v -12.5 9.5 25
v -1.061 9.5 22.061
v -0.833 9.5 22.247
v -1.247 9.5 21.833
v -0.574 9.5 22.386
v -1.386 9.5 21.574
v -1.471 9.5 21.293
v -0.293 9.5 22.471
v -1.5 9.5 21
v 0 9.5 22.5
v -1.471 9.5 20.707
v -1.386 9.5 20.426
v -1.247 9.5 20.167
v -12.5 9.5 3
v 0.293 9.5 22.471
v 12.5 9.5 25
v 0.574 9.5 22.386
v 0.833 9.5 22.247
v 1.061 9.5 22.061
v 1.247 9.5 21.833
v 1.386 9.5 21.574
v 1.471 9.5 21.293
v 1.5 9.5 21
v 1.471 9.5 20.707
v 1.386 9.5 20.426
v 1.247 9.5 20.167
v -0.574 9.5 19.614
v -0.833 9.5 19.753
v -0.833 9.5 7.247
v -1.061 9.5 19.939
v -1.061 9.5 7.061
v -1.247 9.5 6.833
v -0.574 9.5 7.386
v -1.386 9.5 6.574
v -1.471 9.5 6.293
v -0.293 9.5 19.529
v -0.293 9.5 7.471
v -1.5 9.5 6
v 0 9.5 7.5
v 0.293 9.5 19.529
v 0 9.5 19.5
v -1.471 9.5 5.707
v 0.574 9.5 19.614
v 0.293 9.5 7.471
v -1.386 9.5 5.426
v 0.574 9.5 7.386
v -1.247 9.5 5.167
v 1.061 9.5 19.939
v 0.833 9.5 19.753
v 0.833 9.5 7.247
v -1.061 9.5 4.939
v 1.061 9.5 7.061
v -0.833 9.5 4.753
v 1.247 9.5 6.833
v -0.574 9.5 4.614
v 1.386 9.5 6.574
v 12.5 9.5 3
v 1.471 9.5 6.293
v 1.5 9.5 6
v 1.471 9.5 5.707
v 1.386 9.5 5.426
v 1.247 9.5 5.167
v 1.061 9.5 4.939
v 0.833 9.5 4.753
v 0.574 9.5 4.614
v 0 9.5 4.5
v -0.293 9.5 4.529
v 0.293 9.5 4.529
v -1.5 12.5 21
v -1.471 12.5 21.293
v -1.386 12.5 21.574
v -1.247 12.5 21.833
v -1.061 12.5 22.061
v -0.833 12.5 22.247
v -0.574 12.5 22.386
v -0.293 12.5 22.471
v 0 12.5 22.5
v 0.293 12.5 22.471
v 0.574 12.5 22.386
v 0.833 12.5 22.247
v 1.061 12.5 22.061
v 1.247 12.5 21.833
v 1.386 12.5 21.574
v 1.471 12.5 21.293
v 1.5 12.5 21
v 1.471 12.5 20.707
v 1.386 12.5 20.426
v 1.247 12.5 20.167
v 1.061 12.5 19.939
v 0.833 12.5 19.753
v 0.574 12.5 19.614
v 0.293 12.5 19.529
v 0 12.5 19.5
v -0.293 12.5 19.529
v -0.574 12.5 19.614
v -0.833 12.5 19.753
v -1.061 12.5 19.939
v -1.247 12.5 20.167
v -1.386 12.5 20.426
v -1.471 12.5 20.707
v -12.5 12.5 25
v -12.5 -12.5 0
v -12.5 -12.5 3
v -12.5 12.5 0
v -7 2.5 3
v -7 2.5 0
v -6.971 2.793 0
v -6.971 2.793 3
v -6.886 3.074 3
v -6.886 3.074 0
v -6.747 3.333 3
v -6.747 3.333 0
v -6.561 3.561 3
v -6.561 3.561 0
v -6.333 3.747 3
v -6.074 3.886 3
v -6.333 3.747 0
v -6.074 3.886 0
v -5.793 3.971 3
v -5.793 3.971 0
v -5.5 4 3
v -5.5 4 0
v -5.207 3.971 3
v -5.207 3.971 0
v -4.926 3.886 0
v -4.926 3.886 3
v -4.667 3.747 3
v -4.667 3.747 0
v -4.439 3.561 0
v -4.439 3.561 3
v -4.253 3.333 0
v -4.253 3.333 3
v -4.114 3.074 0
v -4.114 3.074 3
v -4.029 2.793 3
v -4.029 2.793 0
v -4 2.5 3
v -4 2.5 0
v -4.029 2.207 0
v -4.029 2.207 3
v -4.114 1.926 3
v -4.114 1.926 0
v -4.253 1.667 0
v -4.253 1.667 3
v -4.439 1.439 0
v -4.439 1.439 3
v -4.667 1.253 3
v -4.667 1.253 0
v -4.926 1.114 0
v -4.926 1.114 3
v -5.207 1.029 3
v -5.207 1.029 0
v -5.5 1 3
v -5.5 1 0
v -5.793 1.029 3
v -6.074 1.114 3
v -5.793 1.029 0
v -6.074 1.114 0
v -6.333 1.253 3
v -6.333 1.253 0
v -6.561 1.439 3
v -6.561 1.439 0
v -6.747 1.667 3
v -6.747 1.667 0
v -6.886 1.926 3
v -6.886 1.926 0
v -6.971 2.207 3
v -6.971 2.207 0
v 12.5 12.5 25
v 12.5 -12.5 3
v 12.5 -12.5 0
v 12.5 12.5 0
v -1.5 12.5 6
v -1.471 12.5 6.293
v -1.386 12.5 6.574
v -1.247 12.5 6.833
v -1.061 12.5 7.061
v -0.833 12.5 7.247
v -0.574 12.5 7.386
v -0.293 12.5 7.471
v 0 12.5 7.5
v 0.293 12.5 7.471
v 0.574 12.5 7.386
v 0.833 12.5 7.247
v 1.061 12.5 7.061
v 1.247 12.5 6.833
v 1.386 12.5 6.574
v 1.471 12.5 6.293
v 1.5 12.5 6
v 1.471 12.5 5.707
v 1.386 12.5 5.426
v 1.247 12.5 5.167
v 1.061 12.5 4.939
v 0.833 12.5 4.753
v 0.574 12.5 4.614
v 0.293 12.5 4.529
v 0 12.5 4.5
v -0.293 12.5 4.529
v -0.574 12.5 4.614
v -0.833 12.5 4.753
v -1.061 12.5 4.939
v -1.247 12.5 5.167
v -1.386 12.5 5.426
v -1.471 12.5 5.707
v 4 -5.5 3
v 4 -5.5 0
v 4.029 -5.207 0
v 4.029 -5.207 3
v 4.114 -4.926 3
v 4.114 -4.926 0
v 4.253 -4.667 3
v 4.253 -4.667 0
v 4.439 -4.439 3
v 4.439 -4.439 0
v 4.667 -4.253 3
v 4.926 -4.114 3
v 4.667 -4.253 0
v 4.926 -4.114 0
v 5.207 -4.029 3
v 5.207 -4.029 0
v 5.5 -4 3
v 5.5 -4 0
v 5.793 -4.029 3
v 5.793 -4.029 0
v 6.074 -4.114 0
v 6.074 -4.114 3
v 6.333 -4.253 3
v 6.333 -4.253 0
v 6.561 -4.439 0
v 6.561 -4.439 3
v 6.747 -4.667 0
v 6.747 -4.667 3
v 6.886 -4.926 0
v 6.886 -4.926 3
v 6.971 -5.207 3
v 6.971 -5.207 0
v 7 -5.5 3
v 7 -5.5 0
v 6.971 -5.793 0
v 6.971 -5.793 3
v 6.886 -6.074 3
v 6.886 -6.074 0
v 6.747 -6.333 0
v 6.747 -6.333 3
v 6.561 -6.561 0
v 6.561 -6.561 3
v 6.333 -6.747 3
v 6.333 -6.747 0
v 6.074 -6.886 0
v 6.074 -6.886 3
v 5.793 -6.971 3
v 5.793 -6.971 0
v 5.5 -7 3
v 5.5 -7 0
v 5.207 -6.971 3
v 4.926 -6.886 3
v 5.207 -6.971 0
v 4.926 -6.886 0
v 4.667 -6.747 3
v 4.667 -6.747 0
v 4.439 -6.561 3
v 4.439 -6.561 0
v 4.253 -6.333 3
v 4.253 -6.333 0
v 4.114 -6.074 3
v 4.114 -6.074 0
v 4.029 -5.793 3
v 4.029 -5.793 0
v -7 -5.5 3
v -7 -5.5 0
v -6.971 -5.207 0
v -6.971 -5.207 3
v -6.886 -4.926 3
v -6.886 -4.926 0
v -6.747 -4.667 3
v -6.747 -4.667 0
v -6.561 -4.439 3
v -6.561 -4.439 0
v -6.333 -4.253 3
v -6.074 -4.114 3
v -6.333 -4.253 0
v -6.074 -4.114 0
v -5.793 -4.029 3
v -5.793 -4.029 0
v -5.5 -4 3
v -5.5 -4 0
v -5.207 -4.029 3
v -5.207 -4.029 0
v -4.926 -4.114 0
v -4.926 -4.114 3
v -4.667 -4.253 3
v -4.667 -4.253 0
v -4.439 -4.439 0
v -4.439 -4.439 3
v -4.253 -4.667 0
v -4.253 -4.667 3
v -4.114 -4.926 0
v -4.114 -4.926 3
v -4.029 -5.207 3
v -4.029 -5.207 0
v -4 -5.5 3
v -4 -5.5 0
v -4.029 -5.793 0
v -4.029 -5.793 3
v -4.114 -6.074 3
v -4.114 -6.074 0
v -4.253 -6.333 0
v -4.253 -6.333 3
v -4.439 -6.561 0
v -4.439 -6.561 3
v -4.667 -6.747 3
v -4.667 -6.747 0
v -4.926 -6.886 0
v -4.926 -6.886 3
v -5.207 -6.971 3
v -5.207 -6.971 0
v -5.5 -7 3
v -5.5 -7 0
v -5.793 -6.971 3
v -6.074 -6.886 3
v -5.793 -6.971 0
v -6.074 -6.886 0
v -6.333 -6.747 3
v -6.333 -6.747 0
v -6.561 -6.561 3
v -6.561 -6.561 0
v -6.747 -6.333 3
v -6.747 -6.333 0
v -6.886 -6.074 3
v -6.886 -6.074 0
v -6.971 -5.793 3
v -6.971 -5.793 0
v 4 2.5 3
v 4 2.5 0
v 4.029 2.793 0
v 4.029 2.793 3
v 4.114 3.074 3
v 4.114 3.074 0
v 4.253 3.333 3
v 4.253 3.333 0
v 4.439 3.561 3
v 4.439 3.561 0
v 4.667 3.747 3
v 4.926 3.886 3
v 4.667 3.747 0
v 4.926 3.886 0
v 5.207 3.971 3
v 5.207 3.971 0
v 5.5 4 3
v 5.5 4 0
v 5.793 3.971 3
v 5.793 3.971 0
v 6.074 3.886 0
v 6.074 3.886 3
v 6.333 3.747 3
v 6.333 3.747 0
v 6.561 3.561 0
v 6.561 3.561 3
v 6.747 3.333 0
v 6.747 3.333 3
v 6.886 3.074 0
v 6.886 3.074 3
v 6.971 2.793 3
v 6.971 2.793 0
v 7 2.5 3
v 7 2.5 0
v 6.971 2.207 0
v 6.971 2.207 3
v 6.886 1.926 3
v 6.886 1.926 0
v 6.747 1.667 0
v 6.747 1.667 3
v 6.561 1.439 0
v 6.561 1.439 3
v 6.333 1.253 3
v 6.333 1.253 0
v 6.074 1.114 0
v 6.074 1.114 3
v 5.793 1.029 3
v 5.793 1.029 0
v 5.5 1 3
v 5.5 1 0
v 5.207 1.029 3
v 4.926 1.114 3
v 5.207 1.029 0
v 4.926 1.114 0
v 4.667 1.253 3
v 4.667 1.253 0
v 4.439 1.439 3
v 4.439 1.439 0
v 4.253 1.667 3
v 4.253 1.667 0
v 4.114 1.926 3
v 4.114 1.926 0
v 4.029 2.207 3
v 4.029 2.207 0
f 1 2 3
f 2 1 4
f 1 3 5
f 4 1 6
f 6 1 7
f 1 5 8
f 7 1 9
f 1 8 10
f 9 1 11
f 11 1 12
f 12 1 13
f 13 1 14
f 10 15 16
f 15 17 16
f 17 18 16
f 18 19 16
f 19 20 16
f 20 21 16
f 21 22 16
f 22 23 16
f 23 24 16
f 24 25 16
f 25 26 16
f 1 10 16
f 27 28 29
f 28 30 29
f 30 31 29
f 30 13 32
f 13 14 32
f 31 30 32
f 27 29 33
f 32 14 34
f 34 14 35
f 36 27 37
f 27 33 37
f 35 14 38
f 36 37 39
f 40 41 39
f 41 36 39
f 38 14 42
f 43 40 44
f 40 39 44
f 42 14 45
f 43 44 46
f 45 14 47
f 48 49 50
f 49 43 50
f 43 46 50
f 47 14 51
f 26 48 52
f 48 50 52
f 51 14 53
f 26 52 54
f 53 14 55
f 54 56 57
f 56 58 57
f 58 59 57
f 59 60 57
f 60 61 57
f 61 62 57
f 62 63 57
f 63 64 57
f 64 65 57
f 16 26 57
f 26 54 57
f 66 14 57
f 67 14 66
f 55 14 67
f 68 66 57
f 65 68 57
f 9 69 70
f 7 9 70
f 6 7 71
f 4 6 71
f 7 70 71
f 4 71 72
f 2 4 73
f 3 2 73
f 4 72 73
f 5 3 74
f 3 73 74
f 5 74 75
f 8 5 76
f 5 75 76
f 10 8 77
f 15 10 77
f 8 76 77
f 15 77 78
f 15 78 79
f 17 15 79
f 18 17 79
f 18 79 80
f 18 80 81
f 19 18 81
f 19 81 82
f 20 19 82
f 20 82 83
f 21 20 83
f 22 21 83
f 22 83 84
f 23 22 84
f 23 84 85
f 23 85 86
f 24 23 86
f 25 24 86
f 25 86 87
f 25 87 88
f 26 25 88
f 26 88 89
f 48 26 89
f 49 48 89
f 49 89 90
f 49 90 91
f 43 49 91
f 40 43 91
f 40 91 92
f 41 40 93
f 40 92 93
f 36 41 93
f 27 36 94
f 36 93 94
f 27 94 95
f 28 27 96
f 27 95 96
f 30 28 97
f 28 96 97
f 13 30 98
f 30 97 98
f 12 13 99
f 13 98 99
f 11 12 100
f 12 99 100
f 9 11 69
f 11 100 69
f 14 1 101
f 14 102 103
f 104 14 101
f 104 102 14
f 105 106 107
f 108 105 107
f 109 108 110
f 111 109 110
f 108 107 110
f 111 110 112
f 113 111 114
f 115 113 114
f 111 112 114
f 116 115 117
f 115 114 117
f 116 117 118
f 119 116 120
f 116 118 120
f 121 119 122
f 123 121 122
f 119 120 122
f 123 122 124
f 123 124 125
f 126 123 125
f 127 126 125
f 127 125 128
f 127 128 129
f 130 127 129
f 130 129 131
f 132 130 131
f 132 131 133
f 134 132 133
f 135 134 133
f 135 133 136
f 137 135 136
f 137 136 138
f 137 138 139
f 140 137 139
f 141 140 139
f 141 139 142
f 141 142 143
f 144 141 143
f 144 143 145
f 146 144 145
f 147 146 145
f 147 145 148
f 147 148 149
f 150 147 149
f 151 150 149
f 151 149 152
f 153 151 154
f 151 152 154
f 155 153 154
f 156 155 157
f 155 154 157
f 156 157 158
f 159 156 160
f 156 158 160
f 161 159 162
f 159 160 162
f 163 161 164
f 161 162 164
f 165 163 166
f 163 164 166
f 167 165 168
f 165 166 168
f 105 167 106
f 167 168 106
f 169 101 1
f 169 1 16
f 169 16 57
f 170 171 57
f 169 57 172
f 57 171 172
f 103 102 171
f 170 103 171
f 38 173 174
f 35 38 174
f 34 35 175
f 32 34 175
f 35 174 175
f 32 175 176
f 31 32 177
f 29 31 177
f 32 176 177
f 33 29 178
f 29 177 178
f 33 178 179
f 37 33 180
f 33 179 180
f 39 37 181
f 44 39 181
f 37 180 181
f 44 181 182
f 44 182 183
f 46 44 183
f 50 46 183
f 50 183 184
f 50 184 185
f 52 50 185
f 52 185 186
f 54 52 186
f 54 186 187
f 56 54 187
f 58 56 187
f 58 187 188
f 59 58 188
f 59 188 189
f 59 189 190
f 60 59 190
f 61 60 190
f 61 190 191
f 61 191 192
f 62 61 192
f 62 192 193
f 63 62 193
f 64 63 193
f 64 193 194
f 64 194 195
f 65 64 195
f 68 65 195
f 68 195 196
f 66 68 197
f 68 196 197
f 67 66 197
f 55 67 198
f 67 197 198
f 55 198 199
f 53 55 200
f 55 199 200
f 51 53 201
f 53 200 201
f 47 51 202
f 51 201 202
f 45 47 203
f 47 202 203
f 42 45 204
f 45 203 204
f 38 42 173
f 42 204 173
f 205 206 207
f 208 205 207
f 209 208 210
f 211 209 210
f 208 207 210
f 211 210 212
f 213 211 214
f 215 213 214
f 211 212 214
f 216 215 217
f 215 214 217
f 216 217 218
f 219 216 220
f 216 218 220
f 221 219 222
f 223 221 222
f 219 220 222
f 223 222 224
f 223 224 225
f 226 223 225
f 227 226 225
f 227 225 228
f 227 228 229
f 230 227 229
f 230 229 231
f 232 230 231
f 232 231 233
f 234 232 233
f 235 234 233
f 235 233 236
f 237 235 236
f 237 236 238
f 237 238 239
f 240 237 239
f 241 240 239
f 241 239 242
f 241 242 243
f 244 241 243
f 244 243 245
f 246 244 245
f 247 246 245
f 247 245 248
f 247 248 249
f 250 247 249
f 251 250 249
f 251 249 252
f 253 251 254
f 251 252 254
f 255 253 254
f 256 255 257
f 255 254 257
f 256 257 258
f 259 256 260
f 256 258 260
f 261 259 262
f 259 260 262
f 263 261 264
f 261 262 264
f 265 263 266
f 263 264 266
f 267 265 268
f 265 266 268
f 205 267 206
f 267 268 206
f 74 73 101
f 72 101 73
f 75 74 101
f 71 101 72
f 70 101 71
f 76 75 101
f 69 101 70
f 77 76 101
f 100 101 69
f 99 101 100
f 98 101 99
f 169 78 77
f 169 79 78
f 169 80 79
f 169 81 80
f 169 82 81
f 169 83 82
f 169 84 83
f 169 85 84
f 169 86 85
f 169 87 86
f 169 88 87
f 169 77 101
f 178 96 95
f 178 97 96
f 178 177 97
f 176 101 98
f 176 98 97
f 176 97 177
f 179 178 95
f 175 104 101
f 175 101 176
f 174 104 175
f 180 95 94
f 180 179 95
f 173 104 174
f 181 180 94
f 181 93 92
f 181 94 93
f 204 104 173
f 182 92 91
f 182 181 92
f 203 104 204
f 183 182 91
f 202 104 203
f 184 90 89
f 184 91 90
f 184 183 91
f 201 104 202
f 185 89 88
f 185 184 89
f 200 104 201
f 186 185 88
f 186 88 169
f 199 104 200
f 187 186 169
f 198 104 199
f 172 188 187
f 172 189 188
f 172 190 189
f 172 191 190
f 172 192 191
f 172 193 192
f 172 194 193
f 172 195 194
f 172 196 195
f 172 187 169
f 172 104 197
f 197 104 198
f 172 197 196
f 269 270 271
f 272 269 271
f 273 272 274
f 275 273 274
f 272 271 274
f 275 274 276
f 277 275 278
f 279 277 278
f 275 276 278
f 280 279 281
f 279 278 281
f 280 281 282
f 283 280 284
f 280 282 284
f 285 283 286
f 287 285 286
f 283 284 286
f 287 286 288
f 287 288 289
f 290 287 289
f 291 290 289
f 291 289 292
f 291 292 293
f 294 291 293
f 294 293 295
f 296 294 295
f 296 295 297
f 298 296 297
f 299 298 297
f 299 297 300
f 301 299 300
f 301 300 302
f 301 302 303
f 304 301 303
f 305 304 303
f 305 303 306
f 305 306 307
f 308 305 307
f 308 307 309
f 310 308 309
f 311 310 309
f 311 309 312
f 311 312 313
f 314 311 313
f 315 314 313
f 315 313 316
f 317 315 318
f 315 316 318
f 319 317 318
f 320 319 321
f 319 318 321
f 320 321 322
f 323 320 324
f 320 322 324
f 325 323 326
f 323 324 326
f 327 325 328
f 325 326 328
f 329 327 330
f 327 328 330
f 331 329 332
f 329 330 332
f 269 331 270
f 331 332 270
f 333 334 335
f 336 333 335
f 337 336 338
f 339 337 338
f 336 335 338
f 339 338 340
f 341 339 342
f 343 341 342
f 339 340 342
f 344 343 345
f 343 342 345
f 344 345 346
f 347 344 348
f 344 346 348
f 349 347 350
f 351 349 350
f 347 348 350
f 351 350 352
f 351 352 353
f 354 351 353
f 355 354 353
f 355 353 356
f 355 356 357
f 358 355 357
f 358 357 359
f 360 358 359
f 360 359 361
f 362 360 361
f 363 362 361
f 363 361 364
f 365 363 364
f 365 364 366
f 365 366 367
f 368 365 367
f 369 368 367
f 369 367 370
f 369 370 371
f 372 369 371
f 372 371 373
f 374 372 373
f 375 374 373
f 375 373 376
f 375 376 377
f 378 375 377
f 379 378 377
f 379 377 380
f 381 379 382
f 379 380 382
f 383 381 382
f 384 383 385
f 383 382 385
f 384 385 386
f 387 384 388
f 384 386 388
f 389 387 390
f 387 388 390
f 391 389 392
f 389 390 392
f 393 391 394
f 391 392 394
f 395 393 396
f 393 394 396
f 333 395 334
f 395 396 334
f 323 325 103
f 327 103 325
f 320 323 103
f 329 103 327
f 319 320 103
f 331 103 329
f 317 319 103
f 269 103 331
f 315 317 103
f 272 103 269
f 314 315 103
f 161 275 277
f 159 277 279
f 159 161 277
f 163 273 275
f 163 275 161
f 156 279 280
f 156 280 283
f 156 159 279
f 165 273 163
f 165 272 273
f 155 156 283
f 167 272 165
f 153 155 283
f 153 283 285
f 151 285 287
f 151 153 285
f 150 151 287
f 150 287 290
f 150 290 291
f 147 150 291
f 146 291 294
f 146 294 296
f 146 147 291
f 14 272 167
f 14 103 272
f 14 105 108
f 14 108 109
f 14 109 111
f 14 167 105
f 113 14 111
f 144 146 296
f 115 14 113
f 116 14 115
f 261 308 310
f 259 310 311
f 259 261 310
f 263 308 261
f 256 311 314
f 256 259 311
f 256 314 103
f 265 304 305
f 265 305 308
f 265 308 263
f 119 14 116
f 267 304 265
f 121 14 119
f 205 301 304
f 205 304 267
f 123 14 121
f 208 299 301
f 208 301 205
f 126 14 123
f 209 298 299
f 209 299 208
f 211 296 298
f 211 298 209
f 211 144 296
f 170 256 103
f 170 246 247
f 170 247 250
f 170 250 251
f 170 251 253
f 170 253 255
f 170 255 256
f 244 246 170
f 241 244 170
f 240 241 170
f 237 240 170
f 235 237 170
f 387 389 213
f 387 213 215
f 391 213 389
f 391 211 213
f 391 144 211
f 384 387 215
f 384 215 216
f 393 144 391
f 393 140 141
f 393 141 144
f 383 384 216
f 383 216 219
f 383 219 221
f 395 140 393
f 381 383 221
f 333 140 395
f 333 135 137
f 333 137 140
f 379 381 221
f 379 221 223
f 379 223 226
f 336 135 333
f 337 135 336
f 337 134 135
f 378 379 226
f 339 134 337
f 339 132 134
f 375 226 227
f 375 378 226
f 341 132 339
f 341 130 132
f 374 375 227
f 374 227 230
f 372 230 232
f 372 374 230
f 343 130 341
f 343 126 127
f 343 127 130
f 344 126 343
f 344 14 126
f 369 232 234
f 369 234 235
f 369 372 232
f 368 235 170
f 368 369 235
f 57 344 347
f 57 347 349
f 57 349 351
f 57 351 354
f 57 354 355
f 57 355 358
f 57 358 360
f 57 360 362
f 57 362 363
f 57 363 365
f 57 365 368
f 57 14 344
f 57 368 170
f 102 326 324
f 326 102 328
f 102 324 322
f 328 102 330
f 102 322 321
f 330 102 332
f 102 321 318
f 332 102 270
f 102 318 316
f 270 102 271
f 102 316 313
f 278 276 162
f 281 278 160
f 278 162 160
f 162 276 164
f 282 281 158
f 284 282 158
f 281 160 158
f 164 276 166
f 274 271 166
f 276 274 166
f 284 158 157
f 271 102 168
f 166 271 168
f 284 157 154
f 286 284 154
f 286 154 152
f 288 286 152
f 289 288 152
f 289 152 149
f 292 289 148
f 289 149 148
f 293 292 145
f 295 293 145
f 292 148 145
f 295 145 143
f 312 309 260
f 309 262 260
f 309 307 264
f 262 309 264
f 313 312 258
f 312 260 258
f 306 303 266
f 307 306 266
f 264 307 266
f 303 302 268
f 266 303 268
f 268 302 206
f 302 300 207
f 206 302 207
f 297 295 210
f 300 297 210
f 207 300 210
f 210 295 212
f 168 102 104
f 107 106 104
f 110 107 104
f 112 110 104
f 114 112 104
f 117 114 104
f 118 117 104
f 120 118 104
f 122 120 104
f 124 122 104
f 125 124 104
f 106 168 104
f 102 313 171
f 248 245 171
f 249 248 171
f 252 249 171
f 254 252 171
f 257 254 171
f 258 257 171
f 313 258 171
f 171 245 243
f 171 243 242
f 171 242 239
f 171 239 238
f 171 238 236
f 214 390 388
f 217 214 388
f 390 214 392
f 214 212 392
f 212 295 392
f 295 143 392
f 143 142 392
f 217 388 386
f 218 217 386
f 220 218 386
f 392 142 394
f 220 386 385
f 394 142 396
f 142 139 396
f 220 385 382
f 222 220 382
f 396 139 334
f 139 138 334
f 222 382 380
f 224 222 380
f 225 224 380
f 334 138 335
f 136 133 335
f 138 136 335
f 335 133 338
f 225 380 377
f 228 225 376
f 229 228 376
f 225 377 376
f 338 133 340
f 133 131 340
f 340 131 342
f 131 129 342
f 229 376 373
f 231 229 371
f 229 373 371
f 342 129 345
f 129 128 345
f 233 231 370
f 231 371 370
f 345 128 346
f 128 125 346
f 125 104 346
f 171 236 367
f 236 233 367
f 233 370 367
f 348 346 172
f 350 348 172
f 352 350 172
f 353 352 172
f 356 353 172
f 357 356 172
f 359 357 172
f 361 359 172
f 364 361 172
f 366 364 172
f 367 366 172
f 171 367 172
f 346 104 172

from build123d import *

# Parameters (mm, degrees)
F0_W     = 25
F0_H     = 25
F1_DEPTH = 3
F3_D     = 3
F3_DEPTH = 15
F4_W     = 25
F4_H     = 3
F5_DEPTH = 22
F7_D     = 3


with BuildPart() as f1:
    # F0 (on Top) → F1 (new body)
    with BuildSketch(Plane.XY):
        Rectangle(F0_W, F0_H)
    extrude(amount=F1_DEPTH)

    # F3
    with Locations(Plane.XY.offset(3)):
        with Locations((5.5, 2.5), (5.5, -5.5), (-5.5, -5.5), (-5.5, 2.5)):
            Hole(F3_D / 2, depth=F3_DEPTH)

    # F4 (on face) → F5 (join)
    with BuildSketch(Plane.XY.offset(3)):
        with Locations((0, 11)):
            Rectangle(F4_W, F4_H)
    extrude(amount=F5_DEPTH)

    # F7 (through all)
    with Locations(Plane.XZ.offset(-9.5)):
        with Locations((0, 21), (0, 6)):
            Hole(F7_D / 2)


solid = f1.part
